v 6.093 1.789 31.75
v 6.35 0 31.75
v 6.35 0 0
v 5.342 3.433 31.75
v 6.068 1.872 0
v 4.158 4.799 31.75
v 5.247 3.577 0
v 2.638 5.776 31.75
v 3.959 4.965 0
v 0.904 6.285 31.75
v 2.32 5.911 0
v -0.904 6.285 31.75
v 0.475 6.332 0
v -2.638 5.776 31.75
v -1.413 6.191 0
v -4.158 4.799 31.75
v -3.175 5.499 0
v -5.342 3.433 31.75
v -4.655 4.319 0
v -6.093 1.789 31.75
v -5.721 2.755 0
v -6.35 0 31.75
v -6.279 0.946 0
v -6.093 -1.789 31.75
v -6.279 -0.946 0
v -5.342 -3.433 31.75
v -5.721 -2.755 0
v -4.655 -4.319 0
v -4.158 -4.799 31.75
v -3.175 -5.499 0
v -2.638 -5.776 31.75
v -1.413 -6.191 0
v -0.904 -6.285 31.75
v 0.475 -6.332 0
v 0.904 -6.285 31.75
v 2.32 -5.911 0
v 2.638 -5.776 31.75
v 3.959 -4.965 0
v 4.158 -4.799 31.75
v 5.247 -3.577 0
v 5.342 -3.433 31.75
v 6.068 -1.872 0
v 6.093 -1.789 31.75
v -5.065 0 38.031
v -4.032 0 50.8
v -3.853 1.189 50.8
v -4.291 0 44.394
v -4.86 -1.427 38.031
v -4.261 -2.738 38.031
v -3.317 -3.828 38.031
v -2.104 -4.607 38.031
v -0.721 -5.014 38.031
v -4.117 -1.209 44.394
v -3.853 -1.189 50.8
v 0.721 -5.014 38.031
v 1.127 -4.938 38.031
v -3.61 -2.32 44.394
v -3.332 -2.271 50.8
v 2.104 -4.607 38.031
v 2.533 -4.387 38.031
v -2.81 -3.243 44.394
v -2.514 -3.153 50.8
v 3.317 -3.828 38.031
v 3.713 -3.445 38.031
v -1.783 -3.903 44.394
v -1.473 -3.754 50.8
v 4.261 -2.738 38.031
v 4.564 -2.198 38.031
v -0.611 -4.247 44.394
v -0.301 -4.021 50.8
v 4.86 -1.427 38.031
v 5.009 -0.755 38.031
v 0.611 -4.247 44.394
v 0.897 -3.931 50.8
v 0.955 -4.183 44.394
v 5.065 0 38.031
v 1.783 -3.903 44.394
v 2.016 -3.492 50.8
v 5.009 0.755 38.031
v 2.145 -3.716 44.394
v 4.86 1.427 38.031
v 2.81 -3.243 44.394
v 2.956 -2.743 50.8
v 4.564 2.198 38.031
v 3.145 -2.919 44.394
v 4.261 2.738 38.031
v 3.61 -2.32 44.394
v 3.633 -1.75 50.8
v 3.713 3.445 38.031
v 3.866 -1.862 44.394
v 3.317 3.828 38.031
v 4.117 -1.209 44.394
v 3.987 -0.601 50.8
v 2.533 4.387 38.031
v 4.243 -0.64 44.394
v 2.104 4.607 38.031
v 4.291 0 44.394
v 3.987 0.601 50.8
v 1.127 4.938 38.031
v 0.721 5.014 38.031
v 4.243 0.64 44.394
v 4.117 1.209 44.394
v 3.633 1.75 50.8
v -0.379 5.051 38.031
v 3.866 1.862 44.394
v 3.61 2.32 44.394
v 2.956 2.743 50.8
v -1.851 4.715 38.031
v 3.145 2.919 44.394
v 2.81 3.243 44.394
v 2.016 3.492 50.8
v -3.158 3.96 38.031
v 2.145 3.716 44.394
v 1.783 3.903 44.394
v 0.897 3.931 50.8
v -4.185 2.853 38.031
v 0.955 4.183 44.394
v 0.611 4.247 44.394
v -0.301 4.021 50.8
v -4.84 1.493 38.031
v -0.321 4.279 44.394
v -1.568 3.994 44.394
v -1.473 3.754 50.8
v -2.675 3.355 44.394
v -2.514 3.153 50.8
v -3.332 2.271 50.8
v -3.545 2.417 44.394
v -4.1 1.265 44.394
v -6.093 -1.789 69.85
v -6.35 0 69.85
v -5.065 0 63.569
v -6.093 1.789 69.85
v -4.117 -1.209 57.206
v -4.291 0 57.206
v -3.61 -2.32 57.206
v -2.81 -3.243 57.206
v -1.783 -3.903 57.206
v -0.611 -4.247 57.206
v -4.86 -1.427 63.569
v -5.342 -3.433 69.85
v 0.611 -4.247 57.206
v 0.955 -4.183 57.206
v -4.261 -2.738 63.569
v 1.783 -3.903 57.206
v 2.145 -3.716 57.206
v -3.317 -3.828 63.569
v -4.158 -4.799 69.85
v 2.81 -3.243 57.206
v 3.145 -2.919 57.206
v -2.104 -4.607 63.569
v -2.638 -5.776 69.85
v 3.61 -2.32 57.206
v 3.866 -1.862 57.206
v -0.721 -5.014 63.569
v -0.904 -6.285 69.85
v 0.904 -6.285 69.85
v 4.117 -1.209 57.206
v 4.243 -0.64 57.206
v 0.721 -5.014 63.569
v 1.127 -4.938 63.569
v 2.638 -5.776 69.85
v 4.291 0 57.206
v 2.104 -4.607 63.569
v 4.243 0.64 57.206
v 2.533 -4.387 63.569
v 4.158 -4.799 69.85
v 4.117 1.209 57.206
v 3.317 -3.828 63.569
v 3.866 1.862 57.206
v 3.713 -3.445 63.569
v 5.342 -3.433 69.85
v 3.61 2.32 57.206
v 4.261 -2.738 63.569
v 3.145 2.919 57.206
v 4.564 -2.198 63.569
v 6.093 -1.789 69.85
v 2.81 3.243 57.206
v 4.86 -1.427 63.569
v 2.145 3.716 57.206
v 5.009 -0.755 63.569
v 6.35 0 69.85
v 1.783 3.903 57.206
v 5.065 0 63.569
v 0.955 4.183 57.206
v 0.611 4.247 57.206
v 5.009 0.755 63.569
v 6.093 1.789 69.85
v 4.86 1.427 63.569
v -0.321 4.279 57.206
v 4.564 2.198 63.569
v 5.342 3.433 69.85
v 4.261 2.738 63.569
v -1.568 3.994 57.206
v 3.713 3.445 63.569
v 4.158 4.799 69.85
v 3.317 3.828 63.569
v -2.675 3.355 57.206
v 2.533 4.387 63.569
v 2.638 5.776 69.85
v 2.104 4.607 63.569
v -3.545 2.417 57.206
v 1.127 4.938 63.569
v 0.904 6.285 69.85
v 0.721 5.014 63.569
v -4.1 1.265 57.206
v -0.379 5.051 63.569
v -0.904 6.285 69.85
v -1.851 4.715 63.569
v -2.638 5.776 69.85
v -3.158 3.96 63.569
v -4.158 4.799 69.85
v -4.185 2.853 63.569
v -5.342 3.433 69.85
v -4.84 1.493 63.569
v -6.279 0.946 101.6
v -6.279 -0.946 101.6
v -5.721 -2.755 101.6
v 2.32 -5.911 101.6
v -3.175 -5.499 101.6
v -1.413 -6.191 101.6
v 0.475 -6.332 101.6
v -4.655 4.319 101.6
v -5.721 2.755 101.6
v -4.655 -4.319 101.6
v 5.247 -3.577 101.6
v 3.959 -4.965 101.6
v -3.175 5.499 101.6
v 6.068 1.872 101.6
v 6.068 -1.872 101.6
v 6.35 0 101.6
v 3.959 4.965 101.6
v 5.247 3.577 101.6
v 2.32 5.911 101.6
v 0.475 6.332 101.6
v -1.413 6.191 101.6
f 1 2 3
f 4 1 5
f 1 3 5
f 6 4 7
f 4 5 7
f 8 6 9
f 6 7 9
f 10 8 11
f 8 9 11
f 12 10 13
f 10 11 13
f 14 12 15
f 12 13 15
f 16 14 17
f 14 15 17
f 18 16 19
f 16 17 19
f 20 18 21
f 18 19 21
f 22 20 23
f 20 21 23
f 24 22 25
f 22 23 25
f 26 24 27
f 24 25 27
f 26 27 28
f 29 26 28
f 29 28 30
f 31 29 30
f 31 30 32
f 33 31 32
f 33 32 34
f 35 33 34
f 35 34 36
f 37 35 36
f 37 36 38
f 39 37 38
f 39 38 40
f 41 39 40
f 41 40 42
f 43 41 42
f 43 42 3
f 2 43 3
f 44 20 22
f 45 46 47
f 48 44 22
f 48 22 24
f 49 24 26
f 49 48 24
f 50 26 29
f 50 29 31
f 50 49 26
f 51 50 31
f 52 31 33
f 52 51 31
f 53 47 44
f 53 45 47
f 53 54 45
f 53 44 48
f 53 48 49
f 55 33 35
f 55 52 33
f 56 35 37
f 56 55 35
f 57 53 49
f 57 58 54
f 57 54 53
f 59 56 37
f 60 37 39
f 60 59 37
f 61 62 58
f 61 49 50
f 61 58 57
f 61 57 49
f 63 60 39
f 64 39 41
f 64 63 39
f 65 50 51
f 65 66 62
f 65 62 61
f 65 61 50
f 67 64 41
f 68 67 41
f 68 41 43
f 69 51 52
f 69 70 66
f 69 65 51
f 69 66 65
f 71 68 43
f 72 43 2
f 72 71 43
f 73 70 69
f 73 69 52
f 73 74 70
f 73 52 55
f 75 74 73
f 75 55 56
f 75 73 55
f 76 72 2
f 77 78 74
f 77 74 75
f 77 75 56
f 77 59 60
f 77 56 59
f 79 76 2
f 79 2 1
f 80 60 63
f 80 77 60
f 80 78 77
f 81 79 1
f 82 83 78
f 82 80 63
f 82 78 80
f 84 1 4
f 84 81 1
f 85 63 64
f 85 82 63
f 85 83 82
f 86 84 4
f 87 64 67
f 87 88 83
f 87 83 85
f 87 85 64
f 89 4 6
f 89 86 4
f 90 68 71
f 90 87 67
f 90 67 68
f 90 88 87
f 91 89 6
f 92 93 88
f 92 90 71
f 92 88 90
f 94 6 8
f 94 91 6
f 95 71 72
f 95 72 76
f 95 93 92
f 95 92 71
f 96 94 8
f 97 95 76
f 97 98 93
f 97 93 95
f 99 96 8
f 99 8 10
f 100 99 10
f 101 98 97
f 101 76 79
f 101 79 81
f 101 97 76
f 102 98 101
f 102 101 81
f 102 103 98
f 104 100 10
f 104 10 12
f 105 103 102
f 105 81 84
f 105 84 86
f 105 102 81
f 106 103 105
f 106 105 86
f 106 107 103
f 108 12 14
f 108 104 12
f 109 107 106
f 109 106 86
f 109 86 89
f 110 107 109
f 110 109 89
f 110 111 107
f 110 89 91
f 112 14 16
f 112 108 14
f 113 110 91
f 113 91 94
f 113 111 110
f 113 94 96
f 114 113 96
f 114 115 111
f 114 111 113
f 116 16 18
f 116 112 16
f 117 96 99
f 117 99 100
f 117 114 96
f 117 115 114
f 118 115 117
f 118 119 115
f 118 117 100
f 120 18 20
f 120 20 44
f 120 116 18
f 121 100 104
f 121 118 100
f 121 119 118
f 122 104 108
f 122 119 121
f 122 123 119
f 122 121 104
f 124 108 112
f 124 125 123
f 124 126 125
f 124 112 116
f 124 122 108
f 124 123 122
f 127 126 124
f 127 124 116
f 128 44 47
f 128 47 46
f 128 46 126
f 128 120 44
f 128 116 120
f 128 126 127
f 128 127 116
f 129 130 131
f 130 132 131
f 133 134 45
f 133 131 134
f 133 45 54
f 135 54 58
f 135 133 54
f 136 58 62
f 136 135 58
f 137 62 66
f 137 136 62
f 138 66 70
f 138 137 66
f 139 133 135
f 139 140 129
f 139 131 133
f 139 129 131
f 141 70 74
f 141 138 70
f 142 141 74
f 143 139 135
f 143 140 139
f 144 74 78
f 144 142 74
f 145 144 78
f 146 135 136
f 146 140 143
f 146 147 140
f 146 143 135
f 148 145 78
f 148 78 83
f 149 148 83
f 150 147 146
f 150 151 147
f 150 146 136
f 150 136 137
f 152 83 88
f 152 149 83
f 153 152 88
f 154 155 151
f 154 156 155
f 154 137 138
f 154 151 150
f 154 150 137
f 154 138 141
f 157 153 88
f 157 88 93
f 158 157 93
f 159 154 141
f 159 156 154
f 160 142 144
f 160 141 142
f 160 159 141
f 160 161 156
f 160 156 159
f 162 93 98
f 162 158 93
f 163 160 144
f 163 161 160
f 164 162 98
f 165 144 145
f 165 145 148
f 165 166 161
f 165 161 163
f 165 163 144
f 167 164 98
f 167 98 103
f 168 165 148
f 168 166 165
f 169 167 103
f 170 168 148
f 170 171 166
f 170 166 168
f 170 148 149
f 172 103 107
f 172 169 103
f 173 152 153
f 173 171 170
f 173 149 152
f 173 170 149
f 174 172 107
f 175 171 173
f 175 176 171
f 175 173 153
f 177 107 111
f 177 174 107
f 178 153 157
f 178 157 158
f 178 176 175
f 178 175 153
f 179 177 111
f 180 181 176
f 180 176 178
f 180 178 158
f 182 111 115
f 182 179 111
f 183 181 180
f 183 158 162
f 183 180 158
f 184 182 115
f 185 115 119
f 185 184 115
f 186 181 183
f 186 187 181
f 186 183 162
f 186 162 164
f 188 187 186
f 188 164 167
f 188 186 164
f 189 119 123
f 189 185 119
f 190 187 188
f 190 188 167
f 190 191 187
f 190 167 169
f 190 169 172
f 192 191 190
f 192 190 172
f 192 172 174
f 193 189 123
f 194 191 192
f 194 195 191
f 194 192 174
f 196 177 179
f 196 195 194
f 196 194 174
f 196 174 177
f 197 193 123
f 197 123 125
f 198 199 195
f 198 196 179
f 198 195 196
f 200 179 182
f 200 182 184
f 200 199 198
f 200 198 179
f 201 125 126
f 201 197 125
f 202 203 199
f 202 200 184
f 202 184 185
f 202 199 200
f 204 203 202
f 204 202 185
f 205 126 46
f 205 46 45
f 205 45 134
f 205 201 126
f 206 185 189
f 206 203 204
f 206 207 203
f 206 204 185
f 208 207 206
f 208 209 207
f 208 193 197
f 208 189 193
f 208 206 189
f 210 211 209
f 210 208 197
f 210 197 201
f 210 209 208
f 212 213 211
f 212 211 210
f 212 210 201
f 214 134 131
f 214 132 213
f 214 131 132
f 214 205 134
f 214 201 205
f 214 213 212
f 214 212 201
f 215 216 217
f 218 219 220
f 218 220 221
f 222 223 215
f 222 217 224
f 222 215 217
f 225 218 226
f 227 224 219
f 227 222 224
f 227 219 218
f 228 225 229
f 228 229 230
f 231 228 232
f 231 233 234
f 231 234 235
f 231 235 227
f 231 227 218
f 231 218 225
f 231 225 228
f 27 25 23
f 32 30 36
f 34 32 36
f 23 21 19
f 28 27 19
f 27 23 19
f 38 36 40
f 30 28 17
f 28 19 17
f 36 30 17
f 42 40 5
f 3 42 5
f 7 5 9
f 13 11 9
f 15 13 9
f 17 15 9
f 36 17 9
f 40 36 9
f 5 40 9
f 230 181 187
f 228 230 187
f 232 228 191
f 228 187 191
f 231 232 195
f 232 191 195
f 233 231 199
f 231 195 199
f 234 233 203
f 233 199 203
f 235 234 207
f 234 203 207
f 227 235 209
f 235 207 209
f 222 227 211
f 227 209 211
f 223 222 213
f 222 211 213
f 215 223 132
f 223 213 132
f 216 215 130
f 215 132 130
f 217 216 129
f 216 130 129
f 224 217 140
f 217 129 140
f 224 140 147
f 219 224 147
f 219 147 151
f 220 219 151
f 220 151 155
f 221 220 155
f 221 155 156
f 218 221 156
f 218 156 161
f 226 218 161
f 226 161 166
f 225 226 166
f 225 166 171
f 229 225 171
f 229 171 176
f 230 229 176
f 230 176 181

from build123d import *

# Parameters (mm, degrees)
SKETCH2_R           = 6.35
BOSS_EXTRUDE1_DEPTH = 31.75
SKETCH8_R           = 6.35
BOSS_EXTRUDE2_DEPTH = 31.75


with BuildPart() as part:
    # Sketch2 → Boss-Extrude1 (new body)
    with BuildSketch(Plane.XY):
        Circle(SKETCH2_R)
    extrude(amount=BOSS_EXTRUDE1_DEPTH)

    # Sketch7 → Revolve1 (revolve)
    with BuildSketch(Plane(origin=(0, 0, 0), x_dir=(0, 0, -1), z_dir=(1, 0, 0))):
        with BuildLine():
            Line((-31.75, 0), (-31.75, 6.35))
            ThreePointArc((-31.75, 6.35), (-50.8, 4.03225), (-69.85, 6.35))
            Line((-69.85, 6.35), (-69.85, 0))
            Line((-69.85, 0), (-31.75, 0))
        make_face()
    revolve(axis=Axis((0, 0, 0), (0, 0, 1)))

    # Sketch8 → Boss-Extrude2 (add)
    with BuildSketch(Plane.XY.offset(69.85)):
        Circle(SKETCH8_R)
    extrude(amount=BOSS_EXTRUDE2_DEPTH)


solid = part.part
